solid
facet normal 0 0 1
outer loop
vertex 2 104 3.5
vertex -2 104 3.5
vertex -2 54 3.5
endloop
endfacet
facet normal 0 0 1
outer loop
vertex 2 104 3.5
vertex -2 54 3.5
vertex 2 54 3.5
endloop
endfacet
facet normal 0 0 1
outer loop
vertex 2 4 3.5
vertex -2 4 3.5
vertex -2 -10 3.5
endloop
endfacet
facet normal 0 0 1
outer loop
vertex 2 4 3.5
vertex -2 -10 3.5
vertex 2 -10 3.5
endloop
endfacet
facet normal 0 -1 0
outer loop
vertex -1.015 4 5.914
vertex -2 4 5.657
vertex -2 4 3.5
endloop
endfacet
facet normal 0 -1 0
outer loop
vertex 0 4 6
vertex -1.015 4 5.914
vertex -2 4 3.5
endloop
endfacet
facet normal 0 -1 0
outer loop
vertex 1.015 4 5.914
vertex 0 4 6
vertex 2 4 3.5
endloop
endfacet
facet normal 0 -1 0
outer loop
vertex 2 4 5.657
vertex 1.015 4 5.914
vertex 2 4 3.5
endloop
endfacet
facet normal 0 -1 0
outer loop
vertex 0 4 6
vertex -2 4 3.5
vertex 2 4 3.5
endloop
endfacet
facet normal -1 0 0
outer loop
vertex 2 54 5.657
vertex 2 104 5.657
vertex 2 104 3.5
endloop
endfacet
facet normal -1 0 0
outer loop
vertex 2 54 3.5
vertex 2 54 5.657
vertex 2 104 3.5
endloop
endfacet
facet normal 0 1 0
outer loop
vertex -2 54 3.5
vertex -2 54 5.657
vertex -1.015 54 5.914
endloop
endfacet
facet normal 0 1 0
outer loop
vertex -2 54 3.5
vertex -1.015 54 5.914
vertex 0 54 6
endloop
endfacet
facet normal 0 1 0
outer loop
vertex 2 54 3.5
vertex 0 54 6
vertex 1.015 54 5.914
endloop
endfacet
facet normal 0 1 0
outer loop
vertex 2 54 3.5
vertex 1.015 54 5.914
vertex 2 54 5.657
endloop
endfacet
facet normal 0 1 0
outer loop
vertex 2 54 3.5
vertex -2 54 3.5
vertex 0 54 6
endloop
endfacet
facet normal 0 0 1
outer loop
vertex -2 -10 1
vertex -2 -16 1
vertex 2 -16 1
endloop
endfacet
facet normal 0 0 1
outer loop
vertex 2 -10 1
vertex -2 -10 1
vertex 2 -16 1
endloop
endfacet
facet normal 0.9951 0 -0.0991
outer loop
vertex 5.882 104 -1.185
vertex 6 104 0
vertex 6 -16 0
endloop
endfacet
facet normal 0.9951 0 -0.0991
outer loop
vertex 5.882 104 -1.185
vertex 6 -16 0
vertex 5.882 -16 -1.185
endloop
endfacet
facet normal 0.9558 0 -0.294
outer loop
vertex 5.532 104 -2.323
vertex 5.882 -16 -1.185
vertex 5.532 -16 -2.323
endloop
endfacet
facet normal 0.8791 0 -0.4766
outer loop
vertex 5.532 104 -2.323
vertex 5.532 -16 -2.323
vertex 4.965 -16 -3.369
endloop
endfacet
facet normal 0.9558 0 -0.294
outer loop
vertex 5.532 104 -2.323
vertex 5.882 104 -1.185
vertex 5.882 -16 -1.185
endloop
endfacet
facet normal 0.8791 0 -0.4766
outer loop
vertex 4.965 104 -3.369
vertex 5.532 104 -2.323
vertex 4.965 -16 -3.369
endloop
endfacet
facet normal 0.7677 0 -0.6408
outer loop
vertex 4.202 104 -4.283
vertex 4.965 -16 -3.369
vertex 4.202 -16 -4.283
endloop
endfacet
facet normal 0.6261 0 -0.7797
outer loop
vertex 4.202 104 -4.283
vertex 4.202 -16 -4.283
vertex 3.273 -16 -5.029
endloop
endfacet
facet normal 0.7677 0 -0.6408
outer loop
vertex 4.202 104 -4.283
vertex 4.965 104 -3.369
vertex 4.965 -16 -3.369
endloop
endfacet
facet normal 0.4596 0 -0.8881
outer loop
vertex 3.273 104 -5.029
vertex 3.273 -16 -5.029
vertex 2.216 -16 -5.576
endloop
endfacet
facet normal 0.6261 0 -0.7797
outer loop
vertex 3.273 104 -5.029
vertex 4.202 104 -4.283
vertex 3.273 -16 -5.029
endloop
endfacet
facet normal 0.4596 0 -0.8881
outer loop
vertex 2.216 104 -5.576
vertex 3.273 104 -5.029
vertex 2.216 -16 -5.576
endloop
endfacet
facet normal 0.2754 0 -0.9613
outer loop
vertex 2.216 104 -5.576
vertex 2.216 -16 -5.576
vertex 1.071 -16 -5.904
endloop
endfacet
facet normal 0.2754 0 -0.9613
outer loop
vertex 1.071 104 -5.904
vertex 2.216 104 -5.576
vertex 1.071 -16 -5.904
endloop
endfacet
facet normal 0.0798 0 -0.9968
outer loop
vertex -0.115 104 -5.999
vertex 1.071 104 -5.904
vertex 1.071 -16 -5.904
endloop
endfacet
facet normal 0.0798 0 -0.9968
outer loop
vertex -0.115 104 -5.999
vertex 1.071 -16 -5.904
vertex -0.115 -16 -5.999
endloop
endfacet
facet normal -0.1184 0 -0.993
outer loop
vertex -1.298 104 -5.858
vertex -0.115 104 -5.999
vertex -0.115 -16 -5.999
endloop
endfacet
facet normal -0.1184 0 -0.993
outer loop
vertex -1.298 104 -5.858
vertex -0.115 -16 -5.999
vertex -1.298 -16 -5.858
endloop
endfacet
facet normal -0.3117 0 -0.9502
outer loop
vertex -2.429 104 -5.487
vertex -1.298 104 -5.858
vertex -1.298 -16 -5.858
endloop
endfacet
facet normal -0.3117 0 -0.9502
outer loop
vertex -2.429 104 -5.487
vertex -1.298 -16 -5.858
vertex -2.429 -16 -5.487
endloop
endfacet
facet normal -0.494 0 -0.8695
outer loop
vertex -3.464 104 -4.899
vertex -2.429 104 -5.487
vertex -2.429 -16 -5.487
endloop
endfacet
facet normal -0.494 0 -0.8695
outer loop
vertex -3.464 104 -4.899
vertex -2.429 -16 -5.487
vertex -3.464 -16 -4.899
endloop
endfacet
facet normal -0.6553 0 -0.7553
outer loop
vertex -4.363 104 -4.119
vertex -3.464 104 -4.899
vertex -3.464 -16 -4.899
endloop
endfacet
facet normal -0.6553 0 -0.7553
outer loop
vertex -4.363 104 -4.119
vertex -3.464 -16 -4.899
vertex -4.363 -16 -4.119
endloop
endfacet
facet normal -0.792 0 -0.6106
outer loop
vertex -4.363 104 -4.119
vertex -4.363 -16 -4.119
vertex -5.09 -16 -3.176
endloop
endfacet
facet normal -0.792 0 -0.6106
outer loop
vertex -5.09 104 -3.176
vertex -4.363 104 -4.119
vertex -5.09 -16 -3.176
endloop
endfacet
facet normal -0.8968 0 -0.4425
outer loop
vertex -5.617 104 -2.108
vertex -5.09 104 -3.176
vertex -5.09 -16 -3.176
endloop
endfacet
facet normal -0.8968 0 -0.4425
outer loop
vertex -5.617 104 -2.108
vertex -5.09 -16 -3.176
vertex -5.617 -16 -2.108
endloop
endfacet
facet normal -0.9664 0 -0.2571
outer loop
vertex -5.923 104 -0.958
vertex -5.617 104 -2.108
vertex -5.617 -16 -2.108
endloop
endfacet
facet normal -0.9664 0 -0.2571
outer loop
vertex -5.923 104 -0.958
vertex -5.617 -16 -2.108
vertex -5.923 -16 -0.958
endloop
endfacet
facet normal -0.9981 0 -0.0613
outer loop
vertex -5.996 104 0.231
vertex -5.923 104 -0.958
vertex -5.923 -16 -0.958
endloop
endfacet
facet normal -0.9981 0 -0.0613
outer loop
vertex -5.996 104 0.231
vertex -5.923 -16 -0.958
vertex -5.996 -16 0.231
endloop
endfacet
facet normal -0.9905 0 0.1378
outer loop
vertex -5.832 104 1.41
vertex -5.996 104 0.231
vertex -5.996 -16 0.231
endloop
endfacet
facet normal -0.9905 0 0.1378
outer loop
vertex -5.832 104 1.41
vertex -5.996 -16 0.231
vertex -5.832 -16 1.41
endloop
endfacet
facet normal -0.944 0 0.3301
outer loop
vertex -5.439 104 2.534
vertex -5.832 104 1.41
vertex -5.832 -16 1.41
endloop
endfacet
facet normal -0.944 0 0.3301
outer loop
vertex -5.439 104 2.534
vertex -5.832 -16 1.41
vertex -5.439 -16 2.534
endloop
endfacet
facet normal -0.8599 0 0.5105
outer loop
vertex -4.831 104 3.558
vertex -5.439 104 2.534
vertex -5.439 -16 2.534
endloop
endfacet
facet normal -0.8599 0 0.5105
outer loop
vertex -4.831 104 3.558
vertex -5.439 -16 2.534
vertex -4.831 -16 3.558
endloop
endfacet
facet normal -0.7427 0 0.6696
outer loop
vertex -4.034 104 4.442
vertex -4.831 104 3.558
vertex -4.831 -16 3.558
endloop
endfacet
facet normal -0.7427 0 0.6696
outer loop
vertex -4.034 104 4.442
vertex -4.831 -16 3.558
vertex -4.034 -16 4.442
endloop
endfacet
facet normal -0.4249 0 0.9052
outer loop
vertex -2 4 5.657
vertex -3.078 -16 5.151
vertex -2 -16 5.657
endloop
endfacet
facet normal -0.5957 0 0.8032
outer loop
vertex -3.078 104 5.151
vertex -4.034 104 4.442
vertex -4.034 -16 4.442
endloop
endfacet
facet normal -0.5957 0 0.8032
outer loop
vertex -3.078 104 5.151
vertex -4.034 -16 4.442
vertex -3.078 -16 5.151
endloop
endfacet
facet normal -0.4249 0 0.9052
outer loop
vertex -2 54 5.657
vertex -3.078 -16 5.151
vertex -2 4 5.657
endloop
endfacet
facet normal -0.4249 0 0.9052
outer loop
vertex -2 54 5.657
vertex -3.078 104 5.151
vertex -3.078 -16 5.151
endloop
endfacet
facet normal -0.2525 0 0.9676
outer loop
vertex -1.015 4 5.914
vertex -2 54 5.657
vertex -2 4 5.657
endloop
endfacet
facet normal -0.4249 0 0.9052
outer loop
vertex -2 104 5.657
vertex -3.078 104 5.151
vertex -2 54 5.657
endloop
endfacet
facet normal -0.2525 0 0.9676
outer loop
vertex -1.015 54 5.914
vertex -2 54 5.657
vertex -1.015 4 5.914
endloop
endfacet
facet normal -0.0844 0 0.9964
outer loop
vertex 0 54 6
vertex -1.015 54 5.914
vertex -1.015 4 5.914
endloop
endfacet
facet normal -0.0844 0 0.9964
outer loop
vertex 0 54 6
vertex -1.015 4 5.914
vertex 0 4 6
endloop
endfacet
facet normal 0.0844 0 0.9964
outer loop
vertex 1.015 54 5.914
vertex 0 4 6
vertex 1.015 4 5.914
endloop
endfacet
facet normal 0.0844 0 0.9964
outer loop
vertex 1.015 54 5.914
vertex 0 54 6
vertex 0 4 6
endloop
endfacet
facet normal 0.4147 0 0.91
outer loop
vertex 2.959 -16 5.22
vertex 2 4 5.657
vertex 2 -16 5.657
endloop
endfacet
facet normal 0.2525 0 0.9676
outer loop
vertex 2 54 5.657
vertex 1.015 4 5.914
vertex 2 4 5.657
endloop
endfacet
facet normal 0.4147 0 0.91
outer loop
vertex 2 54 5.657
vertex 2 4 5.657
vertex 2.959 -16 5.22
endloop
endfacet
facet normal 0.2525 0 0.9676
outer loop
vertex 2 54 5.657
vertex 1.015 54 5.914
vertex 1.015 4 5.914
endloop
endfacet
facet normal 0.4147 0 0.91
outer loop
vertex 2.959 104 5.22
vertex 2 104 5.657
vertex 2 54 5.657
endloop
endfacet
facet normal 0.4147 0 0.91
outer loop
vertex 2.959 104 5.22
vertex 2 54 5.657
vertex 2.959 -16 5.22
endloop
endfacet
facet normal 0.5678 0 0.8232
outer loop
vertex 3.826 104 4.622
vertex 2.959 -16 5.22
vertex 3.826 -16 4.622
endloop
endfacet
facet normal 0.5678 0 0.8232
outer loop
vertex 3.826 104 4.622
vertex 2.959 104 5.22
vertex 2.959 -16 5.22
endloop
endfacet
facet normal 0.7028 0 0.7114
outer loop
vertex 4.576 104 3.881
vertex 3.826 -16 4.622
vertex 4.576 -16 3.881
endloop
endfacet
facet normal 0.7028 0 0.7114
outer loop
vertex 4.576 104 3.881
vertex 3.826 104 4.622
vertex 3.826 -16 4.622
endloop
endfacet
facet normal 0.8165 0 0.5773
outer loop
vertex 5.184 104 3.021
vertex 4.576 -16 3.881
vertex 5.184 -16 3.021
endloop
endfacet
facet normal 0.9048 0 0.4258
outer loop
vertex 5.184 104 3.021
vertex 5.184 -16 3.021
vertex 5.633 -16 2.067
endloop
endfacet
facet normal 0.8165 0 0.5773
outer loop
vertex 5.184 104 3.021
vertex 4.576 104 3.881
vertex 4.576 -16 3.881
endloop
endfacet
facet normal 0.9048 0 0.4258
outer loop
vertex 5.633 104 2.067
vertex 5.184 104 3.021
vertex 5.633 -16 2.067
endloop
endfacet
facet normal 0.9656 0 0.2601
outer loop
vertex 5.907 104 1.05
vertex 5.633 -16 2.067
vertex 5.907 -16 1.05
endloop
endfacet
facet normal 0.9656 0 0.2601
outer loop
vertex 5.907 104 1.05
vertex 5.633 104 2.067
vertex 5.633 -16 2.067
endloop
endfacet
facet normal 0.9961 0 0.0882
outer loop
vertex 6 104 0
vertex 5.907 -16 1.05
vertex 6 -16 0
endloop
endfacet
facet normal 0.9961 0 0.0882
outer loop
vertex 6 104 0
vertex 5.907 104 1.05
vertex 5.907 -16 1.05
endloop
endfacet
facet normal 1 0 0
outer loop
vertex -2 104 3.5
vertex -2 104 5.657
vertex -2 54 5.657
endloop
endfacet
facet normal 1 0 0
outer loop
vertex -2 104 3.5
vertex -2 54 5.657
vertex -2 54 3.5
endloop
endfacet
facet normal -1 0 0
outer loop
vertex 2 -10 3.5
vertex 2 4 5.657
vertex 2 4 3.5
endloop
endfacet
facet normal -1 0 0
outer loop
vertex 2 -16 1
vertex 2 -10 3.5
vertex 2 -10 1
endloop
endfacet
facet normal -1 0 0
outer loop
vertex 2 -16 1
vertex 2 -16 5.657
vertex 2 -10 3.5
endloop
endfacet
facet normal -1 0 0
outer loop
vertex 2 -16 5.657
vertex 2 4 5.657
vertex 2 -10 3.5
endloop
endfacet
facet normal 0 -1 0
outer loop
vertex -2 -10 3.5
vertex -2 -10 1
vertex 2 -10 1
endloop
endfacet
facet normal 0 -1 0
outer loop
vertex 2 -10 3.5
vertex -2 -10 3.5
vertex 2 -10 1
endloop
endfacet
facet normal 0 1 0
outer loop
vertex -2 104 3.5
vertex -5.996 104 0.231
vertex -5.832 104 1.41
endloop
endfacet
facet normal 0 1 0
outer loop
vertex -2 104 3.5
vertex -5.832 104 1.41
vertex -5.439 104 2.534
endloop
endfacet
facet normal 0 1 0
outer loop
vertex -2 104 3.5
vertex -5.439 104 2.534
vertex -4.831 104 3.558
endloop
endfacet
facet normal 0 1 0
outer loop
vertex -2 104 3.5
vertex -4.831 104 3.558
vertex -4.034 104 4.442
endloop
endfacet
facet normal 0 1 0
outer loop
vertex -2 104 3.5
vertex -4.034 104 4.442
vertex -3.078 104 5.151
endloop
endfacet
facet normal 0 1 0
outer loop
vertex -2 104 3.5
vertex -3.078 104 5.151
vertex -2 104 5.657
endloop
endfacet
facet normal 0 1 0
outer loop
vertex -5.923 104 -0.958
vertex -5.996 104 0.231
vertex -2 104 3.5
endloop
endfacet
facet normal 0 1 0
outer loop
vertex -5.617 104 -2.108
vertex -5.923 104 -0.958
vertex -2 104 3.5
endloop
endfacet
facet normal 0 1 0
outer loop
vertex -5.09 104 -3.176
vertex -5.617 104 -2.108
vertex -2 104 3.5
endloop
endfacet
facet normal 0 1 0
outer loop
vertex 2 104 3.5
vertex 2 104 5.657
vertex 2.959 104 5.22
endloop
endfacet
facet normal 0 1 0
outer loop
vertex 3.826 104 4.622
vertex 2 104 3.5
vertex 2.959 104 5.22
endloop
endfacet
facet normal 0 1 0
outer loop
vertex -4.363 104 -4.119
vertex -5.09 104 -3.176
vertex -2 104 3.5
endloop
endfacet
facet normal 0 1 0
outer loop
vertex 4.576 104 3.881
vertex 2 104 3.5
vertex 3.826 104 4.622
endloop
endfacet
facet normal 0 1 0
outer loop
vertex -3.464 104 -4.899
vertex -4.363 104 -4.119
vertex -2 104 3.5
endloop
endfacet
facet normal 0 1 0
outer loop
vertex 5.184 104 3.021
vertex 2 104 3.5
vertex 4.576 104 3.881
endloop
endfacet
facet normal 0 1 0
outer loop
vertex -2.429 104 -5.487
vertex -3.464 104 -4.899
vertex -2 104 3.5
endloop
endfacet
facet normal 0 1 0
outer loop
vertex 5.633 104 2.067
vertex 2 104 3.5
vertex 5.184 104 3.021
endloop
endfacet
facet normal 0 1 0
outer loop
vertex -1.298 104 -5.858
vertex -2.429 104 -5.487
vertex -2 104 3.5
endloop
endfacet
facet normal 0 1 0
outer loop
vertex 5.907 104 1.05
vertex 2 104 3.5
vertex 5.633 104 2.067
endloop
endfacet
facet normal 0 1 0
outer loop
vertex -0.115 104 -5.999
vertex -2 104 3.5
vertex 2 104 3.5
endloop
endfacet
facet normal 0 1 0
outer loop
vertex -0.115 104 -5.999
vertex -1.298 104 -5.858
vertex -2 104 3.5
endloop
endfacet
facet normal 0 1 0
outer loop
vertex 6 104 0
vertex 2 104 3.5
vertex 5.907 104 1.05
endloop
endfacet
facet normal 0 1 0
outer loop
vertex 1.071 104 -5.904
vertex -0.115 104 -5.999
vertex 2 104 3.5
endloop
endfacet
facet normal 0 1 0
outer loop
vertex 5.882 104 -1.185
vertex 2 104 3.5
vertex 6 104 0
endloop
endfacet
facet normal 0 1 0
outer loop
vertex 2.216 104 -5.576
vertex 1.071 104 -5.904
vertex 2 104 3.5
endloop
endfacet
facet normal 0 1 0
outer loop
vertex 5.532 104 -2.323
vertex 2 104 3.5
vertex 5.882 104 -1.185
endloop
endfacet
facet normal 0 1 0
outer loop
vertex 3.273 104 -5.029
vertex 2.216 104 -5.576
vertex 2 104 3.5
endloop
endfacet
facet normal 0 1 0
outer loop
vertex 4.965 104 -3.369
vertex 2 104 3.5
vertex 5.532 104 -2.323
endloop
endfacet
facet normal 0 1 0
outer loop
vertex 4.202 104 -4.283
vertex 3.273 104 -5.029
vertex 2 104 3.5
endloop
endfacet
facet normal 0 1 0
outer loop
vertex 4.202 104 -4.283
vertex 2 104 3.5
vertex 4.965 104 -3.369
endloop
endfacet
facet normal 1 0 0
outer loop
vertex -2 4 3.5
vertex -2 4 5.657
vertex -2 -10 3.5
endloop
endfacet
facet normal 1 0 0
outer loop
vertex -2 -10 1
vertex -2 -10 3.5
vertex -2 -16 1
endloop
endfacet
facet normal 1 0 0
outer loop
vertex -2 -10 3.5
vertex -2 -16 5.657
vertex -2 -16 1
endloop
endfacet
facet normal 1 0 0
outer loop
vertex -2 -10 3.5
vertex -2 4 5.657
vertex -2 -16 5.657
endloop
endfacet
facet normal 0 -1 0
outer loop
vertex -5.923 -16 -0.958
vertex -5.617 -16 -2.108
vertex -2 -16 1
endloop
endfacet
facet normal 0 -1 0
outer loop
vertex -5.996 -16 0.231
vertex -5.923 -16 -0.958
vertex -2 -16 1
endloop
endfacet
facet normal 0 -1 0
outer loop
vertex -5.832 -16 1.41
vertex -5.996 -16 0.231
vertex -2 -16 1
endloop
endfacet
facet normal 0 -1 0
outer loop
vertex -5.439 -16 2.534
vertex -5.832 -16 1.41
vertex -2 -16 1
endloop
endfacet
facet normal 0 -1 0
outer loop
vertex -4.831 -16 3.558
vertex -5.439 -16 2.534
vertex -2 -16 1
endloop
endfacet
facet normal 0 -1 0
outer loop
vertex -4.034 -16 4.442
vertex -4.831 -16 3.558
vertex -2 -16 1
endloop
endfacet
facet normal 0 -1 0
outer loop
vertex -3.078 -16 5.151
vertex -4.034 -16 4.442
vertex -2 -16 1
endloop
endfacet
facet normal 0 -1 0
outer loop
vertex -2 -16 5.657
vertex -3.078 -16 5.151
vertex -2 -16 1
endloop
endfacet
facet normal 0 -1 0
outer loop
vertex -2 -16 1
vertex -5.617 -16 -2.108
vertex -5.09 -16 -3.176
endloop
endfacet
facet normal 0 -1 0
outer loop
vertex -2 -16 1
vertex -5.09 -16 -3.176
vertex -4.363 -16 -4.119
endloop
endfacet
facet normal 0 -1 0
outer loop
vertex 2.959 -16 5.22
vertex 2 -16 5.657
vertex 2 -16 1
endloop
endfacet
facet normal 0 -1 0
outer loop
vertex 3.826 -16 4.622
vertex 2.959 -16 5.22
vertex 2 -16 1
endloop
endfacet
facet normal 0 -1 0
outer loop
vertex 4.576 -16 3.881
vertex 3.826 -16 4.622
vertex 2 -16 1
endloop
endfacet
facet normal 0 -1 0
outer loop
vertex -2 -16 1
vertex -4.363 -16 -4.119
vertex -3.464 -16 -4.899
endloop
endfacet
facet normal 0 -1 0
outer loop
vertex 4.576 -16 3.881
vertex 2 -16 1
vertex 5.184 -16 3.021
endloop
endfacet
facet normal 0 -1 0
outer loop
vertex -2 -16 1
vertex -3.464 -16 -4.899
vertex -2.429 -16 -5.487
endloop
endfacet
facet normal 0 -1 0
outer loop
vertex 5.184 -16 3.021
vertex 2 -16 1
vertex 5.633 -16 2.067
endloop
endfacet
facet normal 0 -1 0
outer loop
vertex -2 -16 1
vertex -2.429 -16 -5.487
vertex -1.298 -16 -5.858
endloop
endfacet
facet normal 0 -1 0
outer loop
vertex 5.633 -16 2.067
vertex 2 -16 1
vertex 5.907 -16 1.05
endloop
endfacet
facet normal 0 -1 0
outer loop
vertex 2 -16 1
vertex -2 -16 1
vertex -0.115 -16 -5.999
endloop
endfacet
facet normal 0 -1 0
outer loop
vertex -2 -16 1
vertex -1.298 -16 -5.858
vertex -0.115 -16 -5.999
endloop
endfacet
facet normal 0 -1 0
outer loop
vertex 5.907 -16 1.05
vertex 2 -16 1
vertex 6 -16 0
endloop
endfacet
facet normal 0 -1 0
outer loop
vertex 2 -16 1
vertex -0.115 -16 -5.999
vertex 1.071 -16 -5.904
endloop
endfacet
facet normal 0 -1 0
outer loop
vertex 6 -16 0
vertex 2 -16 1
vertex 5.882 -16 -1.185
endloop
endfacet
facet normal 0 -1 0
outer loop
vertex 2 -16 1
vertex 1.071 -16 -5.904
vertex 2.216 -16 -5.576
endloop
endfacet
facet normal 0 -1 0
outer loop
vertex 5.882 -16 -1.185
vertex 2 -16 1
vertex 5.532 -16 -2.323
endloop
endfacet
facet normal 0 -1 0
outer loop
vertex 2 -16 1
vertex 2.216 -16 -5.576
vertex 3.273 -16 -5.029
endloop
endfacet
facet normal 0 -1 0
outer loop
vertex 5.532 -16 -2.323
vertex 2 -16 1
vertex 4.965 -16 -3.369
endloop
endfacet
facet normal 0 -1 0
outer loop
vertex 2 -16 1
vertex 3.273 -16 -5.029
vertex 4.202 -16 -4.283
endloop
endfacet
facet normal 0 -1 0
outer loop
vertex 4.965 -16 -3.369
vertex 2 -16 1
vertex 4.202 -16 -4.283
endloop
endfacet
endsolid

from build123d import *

# Parameters (mm, degrees)
SKETCH1_R                = 6
BOSS_EXTRUDE1_DEPTH      = 104
BOSS_EXTRUDE1_DEPTH_BACK = 16
CUT_EXTRUDE3_START       = -16
SKETCH2_W                = 4
SKETCH2_H                = 5
CUT_EXTRUDE3_DEPTH       = 20
CUT_EXTRUDE3_DEPTH_BACK  = 0.0001
CUT_EXTRUDE4_START       = 104
SKETCH2_2_W              = 4
SKETCH2_2_H              = 5
CUT_EXTRUDE4_DEPTH       = 50
CUT_EXTRUDE6_START       = -16
SKETCH3_W                = 4
SKETCH3_H                = 10
CUT_EXTRUDE6_DEPTH       = 6


with BuildPart() as part:
    # Sketch1 → Boss-Extrude1 (new body, two sides)
    with BuildSketch(Plane(origin=(0, 0, 0), x_dir=(1, 0, 0), z_dir=(0, 1, 0))) as boss_extrude1_sk:
        Circle(SKETCH1_R)
    extrude(amount=BOSS_EXTRUDE1_DEPTH)
    extrude(boss_extrude1_sk.sketch, amount=-BOSS_EXTRUDE1_DEPTH_BACK)

    # Sketch2 → Cut-Extrude3 (cut, two sides)
    with BuildSketch(Plane(origin=(0, 0, 0), x_dir=(1, 0, 0), z_dir=(0, 1, 0)).offset(CUT_EXTRUDE3_START)) as cut_extrude3_sk:
        with Locations((0, -6)):
            Rectangle(SKETCH2_W, SKETCH2_H)
    extrude(amount=CUT_EXTRUDE3_DEPTH, mode=Mode.SUBTRACT)
    extrude(cut_extrude3_sk.sketch, amount=-CUT_EXTRUDE3_DEPTH_BACK, mode=Mode.SUBTRACT)

    # Sketch2<2> → Cut-Extrude4 (cut)
    with BuildSketch(Plane(origin=(0, 0, 0), x_dir=(1, 0, 0), z_dir=(0, 1, 0)).offset(CUT_EXTRUDE4_START)):
        with Locations((0, -6)):
            Rectangle(SKETCH2_2_W, SKETCH2_2_H)
    extrude(amount=-CUT_EXTRUDE4_DEPTH, mode=Mode.SUBTRACT)

    # Sketch3 → Cut-Extrude6 (cut)
    with BuildSketch(Plane(origin=(0, 0, 0), x_dir=(1, 0, 0), z_dir=(0, 1, 0)).offset(CUT_EXTRUDE6_START)):
        with Locations((0, -6)):
            Rectangle(SKETCH3_W, SKETCH3_H)
    extrude(amount=CUT_EXTRUDE6_DEPTH, mode=Mode.SUBTRACT)


solid = part.part
